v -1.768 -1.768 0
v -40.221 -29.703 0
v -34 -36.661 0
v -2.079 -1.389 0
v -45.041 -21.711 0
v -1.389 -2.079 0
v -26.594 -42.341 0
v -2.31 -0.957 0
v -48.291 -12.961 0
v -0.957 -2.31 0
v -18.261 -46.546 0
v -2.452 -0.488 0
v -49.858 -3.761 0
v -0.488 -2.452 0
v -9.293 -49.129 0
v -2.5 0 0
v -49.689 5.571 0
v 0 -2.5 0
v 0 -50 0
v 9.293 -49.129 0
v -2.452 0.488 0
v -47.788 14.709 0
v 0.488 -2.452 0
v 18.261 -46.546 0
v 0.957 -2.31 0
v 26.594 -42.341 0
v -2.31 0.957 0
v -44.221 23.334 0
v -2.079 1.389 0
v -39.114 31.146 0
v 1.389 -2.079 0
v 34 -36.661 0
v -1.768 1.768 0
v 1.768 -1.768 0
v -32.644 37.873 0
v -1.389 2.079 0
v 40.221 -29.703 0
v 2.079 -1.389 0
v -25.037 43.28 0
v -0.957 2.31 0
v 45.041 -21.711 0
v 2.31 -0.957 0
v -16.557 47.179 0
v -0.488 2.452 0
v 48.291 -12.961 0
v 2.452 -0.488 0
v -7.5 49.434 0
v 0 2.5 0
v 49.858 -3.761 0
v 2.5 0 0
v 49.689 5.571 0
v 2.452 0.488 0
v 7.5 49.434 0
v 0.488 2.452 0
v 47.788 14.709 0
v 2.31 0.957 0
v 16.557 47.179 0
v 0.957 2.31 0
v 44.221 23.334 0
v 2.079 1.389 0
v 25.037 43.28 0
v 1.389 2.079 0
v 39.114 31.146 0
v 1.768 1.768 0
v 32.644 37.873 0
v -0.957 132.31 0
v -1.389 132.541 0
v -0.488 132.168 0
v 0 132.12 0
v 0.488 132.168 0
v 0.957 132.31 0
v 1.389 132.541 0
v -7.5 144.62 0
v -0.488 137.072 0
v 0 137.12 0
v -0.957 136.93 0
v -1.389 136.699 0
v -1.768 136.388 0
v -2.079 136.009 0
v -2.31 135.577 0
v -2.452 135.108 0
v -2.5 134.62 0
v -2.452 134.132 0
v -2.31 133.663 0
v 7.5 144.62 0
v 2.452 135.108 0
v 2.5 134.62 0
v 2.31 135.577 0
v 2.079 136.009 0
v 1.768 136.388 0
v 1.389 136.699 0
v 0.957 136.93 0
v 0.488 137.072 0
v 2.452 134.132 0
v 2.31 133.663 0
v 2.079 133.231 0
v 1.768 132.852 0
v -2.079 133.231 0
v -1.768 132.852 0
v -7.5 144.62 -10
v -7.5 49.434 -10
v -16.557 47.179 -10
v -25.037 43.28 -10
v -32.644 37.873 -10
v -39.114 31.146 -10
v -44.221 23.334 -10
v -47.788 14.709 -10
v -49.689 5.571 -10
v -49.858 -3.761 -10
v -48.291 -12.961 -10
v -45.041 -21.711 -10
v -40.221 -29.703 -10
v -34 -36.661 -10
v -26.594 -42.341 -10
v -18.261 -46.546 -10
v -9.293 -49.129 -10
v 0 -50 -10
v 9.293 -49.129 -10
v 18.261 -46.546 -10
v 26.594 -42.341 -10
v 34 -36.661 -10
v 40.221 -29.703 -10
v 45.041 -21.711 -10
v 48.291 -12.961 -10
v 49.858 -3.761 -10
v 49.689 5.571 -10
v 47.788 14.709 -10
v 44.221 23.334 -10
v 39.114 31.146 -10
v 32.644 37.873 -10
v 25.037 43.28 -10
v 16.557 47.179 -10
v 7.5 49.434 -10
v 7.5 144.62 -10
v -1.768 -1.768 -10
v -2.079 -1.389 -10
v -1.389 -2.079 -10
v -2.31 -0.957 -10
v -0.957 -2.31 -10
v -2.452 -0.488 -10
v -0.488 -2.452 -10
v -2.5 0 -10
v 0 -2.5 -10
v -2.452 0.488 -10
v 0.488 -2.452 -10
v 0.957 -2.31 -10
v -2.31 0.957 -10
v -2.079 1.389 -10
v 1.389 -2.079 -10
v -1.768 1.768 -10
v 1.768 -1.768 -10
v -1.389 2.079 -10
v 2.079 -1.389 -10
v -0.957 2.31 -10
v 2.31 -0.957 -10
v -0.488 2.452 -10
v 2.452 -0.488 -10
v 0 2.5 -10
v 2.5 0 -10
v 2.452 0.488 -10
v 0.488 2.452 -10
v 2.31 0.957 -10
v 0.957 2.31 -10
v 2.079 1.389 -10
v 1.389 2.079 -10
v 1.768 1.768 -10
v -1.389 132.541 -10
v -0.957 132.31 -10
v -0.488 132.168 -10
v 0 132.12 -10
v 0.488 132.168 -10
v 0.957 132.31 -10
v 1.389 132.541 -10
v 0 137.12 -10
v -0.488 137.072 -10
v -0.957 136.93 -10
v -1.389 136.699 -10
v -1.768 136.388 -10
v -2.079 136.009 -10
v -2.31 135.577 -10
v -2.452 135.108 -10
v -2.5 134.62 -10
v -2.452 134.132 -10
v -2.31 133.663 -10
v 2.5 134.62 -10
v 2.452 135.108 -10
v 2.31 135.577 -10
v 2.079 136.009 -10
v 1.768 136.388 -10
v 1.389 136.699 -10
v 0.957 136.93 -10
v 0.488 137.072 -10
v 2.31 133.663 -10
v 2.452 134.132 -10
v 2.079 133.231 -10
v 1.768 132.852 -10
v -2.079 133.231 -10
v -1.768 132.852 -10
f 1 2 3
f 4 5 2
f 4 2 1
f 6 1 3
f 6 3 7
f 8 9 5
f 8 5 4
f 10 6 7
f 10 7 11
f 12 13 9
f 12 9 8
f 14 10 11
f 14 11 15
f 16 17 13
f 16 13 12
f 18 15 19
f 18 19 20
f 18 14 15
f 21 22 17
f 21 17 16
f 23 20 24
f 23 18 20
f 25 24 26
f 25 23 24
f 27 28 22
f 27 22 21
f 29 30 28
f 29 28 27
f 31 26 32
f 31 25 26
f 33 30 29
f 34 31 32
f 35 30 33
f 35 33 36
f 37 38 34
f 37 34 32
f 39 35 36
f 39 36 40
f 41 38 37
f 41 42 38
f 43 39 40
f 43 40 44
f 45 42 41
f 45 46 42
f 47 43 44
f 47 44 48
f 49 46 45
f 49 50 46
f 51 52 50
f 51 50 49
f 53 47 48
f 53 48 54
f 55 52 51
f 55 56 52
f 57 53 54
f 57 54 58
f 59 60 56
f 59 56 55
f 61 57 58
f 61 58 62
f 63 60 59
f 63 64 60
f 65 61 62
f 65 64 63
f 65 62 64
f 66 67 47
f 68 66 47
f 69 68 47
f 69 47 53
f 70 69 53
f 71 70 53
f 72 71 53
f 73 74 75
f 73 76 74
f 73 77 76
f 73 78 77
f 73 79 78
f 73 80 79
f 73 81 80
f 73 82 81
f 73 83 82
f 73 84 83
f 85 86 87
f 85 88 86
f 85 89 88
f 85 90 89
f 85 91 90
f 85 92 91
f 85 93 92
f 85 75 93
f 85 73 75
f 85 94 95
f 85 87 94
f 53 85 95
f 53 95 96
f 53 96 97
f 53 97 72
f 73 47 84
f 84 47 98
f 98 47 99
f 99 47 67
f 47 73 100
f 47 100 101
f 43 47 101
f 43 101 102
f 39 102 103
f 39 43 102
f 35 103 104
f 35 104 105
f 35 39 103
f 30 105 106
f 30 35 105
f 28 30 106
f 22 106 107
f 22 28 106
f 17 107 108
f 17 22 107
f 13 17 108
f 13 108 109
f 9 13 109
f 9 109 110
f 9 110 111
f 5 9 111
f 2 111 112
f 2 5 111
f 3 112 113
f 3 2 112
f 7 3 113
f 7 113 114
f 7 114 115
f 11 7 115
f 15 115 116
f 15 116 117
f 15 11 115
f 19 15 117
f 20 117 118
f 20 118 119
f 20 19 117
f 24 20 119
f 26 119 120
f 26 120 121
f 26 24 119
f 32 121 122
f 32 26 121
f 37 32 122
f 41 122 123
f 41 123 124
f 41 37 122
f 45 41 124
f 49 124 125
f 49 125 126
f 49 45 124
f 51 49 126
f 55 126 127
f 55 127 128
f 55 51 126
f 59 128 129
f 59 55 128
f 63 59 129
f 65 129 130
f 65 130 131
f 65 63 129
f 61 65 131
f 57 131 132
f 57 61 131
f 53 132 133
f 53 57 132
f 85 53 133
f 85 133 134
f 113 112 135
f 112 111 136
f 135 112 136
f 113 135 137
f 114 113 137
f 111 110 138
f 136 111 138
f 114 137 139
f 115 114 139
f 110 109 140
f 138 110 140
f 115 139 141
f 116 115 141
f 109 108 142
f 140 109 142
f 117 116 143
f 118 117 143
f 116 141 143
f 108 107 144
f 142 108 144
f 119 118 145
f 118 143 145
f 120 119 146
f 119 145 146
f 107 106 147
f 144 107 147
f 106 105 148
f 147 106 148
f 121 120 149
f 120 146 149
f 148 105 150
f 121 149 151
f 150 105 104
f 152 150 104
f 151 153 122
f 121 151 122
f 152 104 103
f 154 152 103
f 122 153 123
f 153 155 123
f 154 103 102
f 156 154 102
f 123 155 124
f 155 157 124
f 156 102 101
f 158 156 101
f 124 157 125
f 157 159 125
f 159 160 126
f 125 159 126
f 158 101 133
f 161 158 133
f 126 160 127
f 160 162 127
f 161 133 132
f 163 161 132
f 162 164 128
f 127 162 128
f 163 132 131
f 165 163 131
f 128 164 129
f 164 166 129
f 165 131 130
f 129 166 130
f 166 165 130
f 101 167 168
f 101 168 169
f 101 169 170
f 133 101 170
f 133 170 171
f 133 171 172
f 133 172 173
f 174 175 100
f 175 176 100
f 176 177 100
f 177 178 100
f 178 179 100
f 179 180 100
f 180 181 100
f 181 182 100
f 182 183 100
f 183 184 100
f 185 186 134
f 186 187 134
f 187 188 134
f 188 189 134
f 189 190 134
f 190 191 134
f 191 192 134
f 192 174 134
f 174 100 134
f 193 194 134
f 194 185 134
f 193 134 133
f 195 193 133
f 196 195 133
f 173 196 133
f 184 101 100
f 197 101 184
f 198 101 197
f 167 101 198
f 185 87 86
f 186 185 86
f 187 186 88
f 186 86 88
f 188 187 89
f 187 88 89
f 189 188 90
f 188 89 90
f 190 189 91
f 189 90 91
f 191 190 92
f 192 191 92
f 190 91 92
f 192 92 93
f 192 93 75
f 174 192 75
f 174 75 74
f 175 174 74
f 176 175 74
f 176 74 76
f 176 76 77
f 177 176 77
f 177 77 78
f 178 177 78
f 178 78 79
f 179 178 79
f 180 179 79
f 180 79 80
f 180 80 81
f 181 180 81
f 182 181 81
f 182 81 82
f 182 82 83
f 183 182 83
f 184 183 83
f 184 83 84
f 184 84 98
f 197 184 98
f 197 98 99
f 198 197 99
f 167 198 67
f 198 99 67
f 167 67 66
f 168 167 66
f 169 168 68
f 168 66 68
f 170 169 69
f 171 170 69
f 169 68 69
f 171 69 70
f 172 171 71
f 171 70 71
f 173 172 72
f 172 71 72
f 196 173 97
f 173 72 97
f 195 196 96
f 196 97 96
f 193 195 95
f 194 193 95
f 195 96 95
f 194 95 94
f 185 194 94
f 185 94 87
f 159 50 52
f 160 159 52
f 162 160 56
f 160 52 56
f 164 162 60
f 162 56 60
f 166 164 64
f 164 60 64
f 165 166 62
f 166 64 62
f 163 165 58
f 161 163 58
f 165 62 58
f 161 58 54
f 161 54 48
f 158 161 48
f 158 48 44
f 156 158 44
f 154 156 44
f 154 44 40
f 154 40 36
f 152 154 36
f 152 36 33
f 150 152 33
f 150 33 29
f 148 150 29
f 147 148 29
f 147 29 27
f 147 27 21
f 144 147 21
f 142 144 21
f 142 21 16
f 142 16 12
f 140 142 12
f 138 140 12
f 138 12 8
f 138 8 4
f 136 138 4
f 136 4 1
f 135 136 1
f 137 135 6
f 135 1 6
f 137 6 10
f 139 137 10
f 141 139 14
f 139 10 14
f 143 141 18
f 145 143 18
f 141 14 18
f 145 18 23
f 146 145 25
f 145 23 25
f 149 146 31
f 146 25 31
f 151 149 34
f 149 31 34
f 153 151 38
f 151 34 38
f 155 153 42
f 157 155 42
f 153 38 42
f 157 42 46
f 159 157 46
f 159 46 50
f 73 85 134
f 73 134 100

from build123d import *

# Parameters (mm, degrees)
BASE_FLANGE1_DEPTH = 10
CUT_EXTRUDE1_REACH = 155.346
SKETCH7_R          = 2.5


# Sheet-metal steps are written as plain solids
with BuildPart() as part:
    # Sketch2 → Base-Flange1 (new body)
    with BuildSketch(Plane.XY):
        with BuildLine():
            Line((7.5, 49.434299833), (7.5, 144.62))
            Line((7.5, 144.62), (-7.5, 144.62))
            Line((-7.5, 144.62), (-7.5, 49.434299833))
            ThreePointArc((-7.5, 49.434299833), (0, -50), (7.5, 49.434299833))
        make_face()
    extrude(amount=-BASE_FLANGE1_DEPTH)

    # Sketch7 → Cut-Extrude1 (cut, up to next)
    with BuildSketch(Plane.XY, mode=Mode.PRIVATE) as cut_extrude1_sk1:
        with Locations((0, 134.62)):
            Circle(SKETCH7_R)
    cut_extrude1_tool1 = extrude(cut_extrude1_sk1.sketch, amount=-CUT_EXTRUDE1_REACH, mode=Mode.PRIVATE) & part.part
    # Sketch7 → Cut-Extrude1 (cut, up to next)
    with BuildSketch(Plane.XY, mode=Mode.PRIVATE) as cut_extrude1_sk2:
        Circle(SKETCH7_R)
    cut_extrude1_tool2 = extrude(cut_extrude1_sk2.sketch, amount=-CUT_EXTRUDE1_REACH, mode=Mode.PRIVATE) & part.part
    add(cut_extrude1_tool1.solids().sort_by_distance((0, 134.62, 0))[0], mode=Mode.SUBTRACT)
    add(cut_extrude1_tool2.solids().sort_by_distance((0, 0, 0))[0], mode=Mode.SUBTRACT)


solid = part.part
